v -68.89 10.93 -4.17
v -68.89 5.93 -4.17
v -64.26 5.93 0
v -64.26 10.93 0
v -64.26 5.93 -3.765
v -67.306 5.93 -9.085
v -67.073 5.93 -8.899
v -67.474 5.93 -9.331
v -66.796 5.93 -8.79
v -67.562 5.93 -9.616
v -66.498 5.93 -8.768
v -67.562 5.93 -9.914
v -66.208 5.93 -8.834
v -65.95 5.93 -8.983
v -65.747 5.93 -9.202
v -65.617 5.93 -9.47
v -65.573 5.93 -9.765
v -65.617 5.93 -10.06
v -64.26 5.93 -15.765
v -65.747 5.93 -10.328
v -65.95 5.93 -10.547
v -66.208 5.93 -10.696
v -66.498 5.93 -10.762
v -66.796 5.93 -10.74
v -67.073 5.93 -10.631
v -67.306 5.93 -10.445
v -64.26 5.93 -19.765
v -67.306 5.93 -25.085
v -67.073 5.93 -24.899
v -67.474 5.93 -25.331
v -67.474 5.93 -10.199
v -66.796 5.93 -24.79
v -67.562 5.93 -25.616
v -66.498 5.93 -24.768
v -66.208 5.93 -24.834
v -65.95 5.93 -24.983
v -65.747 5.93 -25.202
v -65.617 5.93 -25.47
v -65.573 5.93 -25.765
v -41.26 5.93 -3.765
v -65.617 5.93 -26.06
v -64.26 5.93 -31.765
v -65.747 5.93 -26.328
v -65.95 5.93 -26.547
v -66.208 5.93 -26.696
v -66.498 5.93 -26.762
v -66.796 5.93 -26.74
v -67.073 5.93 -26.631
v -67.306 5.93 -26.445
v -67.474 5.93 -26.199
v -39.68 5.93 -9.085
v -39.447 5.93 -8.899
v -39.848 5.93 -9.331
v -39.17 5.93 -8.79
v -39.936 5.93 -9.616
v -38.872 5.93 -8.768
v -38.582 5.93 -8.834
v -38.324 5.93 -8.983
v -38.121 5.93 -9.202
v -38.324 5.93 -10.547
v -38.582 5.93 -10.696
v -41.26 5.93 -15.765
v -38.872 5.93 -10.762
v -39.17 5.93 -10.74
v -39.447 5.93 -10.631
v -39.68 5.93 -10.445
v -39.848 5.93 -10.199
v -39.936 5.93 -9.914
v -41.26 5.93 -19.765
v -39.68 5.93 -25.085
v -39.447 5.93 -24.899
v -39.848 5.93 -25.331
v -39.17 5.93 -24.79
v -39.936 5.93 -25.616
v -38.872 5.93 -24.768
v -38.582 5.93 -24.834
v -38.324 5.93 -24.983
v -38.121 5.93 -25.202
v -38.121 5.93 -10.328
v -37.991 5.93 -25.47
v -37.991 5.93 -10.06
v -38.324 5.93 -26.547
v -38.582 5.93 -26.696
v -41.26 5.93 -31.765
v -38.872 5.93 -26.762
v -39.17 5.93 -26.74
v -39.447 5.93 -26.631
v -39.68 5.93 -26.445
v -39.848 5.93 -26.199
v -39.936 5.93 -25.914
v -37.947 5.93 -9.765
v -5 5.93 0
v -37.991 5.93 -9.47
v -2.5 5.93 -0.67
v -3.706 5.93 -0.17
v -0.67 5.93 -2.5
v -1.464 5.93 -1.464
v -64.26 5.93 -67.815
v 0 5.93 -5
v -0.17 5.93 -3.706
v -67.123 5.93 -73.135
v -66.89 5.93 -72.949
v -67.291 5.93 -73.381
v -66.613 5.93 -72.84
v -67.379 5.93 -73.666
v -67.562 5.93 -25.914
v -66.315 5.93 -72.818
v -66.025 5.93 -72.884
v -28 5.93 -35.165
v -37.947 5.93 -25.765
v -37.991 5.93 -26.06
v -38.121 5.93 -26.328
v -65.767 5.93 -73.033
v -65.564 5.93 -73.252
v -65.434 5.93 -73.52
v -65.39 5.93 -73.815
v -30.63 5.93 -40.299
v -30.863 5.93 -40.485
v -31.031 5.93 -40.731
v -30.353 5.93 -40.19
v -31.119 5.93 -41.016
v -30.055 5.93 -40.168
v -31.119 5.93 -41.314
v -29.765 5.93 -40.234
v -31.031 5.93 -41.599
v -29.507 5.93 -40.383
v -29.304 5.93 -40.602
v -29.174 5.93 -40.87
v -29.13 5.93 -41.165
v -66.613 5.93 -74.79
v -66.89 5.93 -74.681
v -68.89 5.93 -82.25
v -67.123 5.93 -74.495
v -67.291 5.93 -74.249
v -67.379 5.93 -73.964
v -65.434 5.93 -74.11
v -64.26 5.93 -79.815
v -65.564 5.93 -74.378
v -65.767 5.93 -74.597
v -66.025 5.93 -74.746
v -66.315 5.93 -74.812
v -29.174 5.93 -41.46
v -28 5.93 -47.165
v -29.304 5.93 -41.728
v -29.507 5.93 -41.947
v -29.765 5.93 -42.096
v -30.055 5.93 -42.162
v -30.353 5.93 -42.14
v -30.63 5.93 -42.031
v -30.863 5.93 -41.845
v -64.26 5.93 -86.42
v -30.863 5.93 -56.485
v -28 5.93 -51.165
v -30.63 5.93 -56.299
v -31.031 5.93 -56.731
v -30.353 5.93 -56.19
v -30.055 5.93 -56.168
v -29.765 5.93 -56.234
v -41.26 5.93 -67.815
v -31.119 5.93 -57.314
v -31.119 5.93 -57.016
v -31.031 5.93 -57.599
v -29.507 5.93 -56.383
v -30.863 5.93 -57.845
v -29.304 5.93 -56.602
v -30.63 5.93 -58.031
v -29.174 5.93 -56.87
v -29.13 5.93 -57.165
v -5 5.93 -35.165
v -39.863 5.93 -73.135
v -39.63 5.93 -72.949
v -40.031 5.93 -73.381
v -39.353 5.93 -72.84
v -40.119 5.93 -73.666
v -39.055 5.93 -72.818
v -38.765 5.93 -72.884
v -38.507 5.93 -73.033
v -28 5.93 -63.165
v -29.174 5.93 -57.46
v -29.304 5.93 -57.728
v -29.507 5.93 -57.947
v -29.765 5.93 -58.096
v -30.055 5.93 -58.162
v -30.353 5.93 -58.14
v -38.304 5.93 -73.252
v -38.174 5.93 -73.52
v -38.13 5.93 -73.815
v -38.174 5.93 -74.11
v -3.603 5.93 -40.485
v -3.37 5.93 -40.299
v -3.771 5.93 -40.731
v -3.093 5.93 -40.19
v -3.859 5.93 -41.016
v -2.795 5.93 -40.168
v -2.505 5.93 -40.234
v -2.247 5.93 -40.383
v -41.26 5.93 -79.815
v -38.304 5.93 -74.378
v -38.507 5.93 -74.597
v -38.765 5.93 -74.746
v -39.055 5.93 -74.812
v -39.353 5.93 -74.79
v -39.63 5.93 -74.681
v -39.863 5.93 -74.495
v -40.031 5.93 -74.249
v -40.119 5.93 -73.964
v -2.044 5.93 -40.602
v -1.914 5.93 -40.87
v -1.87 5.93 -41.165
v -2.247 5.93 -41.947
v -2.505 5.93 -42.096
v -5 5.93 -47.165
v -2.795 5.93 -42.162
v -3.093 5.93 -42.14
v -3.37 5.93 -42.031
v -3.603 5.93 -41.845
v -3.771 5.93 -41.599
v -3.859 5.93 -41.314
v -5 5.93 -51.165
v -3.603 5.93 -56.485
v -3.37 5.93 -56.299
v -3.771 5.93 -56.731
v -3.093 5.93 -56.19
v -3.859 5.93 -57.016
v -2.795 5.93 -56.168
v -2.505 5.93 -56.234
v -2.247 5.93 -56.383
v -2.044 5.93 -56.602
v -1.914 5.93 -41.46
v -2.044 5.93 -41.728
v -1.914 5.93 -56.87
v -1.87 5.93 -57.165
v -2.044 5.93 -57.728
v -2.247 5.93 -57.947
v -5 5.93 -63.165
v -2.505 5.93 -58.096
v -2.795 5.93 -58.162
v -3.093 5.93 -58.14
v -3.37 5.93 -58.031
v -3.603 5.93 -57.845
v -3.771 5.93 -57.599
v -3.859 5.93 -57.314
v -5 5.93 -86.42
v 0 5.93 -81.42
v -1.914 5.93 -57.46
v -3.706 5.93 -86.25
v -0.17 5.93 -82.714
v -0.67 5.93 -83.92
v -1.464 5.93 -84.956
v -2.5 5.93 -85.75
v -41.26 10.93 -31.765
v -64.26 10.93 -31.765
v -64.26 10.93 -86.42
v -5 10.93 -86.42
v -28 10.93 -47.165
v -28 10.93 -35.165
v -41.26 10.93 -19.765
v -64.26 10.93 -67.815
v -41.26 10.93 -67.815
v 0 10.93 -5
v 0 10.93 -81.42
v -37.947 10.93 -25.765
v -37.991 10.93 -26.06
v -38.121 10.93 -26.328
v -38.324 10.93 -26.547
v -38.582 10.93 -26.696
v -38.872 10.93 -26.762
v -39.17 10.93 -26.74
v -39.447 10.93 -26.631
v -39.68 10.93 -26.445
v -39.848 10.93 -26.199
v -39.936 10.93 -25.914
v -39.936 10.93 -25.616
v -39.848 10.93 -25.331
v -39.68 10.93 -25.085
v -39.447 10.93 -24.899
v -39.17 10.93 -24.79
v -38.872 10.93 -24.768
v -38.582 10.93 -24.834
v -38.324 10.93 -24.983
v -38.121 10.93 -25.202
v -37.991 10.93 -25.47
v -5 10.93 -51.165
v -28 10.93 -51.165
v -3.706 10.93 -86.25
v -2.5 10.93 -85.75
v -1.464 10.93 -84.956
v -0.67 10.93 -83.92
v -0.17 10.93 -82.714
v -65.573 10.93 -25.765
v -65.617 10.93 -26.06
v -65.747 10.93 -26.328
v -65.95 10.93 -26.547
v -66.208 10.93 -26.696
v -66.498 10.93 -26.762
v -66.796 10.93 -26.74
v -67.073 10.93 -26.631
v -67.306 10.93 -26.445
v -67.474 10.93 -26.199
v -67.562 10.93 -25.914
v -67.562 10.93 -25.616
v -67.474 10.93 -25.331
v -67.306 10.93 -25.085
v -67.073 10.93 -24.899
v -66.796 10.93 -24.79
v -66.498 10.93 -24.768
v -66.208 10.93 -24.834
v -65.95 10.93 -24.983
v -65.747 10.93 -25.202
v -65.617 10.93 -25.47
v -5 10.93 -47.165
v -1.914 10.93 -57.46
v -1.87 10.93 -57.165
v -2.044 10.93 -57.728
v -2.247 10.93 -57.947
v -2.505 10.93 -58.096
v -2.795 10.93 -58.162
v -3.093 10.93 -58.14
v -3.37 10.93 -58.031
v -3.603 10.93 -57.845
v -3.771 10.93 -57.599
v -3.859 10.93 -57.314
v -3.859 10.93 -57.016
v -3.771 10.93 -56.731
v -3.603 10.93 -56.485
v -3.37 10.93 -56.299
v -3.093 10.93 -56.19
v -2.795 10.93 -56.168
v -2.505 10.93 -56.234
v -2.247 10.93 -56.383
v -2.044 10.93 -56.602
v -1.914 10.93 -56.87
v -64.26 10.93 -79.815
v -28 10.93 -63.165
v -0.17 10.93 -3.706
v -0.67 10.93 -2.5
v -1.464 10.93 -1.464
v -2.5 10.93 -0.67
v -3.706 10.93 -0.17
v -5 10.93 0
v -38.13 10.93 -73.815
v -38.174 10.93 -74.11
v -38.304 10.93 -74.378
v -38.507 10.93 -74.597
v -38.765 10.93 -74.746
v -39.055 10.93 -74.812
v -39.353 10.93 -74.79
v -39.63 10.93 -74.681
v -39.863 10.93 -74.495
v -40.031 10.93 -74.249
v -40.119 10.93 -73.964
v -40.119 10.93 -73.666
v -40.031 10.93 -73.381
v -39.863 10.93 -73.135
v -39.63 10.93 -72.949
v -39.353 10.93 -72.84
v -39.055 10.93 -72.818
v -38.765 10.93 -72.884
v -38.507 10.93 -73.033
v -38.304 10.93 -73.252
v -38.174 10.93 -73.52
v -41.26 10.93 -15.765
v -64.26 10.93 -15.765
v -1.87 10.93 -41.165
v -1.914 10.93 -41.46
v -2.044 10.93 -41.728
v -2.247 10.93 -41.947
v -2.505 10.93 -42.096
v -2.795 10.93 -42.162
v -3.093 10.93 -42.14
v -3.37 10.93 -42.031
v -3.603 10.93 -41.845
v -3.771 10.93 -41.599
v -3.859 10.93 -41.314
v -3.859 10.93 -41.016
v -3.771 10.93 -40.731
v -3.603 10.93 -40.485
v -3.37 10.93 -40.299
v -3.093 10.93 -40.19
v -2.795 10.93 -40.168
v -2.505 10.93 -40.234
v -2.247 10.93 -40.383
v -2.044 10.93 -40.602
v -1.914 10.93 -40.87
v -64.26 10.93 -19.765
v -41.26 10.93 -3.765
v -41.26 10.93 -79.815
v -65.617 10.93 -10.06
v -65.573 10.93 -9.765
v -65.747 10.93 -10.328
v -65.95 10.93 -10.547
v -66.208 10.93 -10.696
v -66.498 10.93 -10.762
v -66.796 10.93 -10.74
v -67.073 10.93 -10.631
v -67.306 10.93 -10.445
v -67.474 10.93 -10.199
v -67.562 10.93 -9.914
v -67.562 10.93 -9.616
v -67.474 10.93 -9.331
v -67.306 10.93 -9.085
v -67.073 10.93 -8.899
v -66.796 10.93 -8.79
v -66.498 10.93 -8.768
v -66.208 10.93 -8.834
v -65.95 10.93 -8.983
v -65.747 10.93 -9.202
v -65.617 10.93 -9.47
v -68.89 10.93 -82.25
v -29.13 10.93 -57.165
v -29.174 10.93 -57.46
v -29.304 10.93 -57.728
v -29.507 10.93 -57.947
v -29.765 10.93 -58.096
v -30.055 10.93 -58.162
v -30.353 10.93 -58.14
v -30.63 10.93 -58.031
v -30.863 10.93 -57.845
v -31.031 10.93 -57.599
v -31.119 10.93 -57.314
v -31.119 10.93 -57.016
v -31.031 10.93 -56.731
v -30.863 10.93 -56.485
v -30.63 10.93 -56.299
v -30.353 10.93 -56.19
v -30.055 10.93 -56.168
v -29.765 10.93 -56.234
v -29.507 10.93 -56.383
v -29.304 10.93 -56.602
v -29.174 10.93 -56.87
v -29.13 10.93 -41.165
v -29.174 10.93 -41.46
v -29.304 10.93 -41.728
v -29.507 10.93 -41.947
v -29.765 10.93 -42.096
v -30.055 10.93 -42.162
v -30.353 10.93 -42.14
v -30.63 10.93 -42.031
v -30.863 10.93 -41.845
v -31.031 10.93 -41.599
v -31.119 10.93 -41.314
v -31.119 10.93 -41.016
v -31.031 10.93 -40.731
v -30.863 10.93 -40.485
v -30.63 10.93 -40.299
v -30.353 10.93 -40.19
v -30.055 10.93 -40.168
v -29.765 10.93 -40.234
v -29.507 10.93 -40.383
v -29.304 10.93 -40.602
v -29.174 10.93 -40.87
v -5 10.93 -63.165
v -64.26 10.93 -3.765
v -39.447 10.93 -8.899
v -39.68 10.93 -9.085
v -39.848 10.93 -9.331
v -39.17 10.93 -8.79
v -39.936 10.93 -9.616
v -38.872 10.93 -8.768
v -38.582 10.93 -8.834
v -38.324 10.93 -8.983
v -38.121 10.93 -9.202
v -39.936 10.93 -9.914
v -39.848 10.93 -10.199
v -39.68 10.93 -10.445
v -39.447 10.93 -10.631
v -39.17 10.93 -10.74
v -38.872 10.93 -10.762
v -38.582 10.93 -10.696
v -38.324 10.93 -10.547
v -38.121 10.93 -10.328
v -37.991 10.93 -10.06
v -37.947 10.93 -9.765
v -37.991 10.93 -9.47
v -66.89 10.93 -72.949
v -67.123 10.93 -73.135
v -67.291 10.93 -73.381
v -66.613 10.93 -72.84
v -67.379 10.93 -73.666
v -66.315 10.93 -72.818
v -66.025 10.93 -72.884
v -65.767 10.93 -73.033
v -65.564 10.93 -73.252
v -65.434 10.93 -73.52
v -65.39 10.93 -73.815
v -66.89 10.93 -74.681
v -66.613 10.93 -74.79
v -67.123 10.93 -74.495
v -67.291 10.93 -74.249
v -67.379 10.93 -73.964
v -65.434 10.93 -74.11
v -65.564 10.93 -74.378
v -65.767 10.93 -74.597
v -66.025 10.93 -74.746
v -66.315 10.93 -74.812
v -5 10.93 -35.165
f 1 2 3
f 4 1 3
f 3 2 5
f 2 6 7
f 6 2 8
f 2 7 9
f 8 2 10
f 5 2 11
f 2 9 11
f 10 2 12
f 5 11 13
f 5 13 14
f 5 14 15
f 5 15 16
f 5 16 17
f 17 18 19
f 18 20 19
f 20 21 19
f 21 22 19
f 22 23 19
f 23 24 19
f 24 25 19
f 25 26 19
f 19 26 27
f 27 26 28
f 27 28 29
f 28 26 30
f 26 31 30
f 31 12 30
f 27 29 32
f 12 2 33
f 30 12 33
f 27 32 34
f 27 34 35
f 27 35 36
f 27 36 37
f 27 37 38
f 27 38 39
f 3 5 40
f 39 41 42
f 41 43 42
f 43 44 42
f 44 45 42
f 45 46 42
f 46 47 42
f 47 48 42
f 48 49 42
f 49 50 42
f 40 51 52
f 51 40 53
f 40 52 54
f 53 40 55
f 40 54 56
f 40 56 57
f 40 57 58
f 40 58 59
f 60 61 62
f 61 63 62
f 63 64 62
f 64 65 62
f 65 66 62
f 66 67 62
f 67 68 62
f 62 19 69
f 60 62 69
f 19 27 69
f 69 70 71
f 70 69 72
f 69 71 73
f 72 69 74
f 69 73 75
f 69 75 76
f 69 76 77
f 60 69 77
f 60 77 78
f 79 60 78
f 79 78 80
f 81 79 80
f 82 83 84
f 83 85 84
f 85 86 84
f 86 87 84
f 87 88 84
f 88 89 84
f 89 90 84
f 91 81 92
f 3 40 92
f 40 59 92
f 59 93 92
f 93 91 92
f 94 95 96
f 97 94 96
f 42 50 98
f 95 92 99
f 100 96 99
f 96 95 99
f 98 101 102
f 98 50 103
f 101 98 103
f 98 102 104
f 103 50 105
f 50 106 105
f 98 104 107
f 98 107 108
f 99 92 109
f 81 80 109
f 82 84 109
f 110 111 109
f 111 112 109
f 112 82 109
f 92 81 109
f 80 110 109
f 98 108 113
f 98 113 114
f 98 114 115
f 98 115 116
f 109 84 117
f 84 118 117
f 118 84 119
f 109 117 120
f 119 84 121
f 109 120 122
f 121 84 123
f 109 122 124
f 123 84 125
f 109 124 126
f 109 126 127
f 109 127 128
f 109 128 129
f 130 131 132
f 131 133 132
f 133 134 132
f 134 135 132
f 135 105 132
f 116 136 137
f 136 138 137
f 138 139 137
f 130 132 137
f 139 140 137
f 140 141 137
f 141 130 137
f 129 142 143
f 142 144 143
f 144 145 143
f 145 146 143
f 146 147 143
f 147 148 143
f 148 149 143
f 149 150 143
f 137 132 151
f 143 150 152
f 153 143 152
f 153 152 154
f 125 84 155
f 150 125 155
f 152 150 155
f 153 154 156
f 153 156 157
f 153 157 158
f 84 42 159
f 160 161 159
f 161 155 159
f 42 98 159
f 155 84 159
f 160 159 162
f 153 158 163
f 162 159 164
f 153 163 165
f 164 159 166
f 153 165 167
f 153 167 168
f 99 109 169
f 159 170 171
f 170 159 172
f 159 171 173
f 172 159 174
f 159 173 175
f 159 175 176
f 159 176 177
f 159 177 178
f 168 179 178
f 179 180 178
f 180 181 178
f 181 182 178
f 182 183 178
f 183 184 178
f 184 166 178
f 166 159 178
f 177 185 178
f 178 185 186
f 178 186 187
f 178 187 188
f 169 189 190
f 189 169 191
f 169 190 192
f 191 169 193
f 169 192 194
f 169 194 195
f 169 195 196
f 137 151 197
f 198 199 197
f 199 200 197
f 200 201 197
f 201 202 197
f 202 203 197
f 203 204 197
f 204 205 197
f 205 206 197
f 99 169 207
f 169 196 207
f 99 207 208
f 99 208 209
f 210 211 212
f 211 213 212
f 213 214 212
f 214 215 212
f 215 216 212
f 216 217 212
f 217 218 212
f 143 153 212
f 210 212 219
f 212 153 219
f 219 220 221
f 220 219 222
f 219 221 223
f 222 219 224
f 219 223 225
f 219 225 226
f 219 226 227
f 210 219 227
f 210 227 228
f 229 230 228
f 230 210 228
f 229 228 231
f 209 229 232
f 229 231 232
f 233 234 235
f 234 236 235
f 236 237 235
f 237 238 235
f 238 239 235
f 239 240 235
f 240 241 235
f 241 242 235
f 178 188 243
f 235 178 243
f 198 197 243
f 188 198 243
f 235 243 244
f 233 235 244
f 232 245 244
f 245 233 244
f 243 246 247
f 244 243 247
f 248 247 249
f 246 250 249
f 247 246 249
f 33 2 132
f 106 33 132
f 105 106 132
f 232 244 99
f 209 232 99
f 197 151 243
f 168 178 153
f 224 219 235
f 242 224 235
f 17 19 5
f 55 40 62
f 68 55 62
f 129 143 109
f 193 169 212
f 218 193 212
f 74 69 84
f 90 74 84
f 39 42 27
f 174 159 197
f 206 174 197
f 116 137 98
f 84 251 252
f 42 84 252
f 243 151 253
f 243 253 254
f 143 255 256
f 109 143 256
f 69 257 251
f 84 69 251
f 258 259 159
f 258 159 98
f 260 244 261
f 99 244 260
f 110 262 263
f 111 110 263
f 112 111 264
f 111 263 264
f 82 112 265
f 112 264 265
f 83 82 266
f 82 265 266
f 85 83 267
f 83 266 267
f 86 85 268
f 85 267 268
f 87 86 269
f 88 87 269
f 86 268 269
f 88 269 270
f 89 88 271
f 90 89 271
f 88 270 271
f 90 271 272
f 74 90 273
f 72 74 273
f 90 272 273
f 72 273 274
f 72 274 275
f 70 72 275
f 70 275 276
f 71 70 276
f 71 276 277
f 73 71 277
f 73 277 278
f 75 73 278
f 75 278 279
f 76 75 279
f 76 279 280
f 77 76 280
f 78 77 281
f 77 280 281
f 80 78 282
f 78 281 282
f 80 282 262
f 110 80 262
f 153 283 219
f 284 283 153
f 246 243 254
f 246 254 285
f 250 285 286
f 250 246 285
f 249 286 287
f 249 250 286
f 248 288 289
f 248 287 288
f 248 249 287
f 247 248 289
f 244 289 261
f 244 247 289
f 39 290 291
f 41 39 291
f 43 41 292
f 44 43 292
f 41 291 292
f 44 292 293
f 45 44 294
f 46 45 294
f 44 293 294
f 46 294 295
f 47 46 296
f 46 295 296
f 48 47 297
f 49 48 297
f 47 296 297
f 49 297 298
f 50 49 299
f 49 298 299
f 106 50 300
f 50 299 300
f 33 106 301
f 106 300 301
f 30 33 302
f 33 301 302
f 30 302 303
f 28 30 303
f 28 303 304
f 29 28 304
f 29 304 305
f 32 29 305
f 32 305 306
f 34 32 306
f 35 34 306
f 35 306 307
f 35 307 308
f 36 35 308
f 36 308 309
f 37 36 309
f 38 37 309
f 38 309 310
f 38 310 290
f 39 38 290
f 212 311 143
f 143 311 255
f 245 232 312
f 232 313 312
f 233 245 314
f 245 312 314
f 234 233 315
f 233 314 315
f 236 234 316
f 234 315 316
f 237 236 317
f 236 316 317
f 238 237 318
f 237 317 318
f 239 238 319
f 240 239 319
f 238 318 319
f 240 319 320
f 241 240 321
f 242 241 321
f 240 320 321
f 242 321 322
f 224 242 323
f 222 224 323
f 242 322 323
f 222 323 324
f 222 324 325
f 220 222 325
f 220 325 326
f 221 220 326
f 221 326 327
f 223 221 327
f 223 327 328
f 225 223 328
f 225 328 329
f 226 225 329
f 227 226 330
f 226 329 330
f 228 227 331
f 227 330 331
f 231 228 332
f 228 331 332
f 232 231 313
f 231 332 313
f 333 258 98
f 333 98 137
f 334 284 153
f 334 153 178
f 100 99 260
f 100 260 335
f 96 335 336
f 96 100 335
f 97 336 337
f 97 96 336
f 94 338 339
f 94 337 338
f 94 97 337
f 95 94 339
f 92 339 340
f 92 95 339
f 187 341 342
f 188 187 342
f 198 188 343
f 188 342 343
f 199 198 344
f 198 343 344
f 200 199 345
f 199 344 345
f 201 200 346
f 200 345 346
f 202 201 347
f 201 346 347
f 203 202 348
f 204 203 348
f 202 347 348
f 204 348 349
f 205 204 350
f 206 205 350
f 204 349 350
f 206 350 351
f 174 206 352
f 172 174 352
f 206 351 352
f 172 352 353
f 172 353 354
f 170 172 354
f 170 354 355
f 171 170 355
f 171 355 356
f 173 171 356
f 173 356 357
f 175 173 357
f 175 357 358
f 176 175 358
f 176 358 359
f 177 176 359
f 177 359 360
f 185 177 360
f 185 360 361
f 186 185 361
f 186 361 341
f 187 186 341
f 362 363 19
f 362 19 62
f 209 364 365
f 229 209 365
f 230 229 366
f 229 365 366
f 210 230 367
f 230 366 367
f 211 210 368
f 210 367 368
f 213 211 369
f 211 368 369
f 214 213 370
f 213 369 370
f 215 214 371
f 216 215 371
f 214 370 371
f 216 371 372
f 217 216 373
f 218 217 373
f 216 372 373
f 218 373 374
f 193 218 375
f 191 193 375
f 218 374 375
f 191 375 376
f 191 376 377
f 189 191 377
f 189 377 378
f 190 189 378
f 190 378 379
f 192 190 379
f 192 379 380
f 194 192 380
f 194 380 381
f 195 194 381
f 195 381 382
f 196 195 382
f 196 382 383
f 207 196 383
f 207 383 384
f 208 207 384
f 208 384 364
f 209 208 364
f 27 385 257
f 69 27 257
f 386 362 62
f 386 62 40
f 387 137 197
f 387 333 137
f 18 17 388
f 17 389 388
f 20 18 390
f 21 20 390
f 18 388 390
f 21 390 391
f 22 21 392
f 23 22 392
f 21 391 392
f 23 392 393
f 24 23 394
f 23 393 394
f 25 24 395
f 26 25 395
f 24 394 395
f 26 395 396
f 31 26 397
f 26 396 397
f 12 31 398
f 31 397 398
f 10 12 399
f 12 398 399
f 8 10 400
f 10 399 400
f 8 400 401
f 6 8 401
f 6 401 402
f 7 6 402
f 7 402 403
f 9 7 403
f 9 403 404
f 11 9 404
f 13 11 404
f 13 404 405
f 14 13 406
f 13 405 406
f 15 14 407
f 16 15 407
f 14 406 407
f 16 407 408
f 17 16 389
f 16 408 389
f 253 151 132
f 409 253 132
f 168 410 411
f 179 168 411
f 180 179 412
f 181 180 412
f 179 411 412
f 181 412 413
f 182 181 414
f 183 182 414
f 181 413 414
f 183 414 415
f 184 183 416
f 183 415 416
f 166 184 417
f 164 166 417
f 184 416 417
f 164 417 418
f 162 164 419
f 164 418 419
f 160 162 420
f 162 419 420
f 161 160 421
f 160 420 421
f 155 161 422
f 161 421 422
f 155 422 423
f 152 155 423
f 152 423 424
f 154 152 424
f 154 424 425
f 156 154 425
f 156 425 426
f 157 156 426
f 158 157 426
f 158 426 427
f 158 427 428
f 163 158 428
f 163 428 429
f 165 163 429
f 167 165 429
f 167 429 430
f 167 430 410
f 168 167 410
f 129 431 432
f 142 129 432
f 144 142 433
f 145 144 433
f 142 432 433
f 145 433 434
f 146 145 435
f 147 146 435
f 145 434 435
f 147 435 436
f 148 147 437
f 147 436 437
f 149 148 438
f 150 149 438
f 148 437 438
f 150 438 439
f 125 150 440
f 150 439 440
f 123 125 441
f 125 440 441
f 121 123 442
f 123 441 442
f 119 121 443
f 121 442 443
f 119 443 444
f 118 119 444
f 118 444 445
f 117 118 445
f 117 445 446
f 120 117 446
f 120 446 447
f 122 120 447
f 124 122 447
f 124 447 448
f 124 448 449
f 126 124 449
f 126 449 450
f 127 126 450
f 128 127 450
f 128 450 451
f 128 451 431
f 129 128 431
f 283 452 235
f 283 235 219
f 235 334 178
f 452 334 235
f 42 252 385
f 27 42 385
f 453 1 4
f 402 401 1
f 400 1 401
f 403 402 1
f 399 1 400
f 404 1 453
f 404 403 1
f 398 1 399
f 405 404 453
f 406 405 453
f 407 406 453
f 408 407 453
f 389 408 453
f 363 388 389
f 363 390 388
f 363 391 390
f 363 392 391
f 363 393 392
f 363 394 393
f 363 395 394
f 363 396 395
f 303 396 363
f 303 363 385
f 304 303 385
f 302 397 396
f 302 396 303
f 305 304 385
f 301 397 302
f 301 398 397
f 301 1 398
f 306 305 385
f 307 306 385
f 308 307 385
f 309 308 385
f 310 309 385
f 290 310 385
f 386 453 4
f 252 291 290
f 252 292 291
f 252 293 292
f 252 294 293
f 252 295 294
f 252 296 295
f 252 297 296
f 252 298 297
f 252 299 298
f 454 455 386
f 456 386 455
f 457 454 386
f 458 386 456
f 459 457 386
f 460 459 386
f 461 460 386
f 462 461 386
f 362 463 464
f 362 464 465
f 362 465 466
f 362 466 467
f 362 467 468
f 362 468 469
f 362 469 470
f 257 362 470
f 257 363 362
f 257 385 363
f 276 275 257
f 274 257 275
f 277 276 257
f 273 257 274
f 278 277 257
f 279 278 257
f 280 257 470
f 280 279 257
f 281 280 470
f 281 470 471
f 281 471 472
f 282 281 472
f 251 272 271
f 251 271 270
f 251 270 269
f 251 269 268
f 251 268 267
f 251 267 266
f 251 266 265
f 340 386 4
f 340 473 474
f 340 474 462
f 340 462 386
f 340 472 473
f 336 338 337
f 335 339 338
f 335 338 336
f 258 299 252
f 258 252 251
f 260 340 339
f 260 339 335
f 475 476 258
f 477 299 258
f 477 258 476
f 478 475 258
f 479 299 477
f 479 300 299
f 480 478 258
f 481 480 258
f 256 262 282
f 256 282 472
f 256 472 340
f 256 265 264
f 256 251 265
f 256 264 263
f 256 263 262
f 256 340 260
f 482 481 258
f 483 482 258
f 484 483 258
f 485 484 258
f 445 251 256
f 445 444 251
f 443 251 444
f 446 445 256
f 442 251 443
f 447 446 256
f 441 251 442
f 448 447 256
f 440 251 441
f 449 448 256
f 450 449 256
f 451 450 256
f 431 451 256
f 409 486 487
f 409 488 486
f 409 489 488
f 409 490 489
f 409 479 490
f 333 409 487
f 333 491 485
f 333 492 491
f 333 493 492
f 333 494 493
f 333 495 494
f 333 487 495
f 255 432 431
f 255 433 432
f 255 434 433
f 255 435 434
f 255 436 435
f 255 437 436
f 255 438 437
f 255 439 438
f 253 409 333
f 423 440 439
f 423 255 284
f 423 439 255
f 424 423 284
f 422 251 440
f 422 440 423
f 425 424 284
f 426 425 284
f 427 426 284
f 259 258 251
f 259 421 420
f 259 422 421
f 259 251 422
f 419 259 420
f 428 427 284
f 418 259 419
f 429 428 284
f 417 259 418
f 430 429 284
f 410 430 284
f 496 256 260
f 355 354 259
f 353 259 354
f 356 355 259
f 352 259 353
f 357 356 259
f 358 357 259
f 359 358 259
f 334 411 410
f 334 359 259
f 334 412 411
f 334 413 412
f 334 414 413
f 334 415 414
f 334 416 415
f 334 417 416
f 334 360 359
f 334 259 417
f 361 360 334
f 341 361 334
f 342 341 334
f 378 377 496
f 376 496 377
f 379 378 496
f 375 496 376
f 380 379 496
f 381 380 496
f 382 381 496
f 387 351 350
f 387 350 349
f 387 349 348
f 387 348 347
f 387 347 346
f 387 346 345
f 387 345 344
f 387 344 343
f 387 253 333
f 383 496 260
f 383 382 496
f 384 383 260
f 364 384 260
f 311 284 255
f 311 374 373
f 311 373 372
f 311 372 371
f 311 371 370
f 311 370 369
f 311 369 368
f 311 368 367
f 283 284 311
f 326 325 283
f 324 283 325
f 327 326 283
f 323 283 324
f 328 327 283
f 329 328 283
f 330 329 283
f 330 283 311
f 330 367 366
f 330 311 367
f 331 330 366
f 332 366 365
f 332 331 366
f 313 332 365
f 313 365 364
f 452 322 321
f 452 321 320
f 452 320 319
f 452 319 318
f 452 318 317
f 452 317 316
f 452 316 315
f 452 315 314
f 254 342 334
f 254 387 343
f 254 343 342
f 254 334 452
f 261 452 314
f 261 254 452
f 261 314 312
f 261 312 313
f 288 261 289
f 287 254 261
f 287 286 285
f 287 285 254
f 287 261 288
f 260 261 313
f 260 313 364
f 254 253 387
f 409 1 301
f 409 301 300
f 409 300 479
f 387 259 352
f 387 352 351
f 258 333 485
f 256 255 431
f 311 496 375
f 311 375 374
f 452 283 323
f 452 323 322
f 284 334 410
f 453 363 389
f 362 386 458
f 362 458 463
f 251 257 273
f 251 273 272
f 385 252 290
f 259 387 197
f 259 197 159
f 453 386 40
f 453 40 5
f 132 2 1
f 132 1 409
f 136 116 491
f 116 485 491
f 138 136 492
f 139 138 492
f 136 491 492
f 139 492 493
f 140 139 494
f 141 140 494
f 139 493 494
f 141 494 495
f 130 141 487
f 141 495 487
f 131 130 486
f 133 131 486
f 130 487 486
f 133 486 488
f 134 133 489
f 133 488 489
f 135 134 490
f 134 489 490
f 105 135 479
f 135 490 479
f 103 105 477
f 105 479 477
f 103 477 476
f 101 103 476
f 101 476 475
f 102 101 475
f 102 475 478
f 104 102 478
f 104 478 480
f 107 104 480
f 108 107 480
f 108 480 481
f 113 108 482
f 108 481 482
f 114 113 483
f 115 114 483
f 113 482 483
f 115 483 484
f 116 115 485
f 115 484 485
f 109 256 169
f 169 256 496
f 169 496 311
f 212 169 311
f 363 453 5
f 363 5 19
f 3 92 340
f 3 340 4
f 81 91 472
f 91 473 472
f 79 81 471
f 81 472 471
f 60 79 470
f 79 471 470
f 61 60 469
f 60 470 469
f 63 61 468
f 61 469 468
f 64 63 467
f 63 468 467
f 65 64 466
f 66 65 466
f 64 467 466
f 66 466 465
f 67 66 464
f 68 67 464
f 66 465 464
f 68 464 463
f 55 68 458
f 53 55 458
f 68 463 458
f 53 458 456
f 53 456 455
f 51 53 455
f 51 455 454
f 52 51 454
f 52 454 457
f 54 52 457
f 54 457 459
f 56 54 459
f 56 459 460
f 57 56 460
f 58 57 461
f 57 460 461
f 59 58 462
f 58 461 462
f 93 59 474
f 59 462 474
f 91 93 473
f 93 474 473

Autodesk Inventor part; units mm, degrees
ref_plane "YZ Plane" through (0, 0, 0) normal (1, 0, 0) x (0, 1, 0)
ref_plane "XZ Plane" through (0, 0, 0) normal (0, 1, 0) x (-1, 0, 0)
ref_plane "Work Plane2" through (0, 5.93, 0) normal (0, 1, 0) x (1, 0, 0)
sketch "Sketch7" plane through (0, 5.93, 0) normal (0, 1, 0) x (1, 0, 0)
  line L0 (-68.89, 72.25) -> (-68.89, 75.38) projected
  line L1 (-70.59, 75.38) -> (-68.89, 75.38) projected
  line L2 (-70.59, 83.0068) -> (-70.59, 75.38) projected
  line L3 (-64.9127, 88.12) -> (-70.59, 83.0068) projected
  line L4 (-5, 88.12) -> (-64.9127, 88.12) projected
  arc A0 (1.7, 81.42) -> (-5, 88.12) centre (-5, 81.42) ccw projected
  line L5 (1.7, 5) -> (1.7, 81.42) projected
  arc A1 (-5, -1.7) -> (1.7, 5) centre (-5, 5) ccw projected
  line L6 (-64.9127, -1.7) -> (-5, -1.7) projected
  line L7 (-70.59, 3.4132) -> (-64.9127, -1.7) projected
  line L8 (-70.59, 14.5) -> (-70.59, 3.4132) projected
  line L9 (-68.89, 14.5) -> (-70.59, 14.5) projected
  line L10 (-68.89, 14.5) -> (-68.89, 17.63) projected
  line L11 (-70.59, 17.63) -> (-68.89, 17.63) projected
  line L12 (-70.59, 47.6) -> (-70.59, 17.63) projected
  line L13 (-68.89, 47.6) -> (-70.59, 47.6) projected
  line L14 (-68.89, 47.6) -> (-68.89, 50.73) projected
  line L15 (-70.59, 50.73) -> (-68.89, 50.73) projected
  line L16 (-70.59, 72.25) -> (-70.59, 50.73) projected
  line L17 (-68.89, 72.25) -> (-70.59, 72.25) projected
  line L18 (5.3534, 92.34) -> (10.14, 87.0271) projected
  line L19 (-69.6869, 92.34) -> (5.3534, 92.34) projected
  line L20 (-73.78, 86.0365) -> (-69.6869, 92.34) projected
  line L21 (-73.78, 75.38) -> (-73.78, 86.0365) projected
  line L22 (-73.78, 75.38) -> (-73.78, 72.25) projected
  line L23 (-73.78, 50.73) -> (-73.78, 72.25) projected
  line L24 (-73.78, 50.73) -> (-73.78, 47.6) projected
  line L25 (-73.78, 17.63) -> (-73.78, 47.6) projected
  line L26 (-73.78, 17.63) -> (-73.78, 14.5) projected
  line L27 (-73.78, -2.6865) -> (-73.78, 14.5) projected
  line L28 (-69.6869, -8.99) -> (-73.78, -2.6865) projected
  line L29 (4.8271, -8.99) -> (-69.6869, -8.99) projected
  line L30 (10.14, -4.2034) -> (4.8271, -8.99) projected
  line L31 (10.14, 87.0271) -> (10.14, -4.2034) projected
  line L32 (-5, 0) -> (-64.26, 0) projected
  line L33 (-68.89, 4.17) -> (-64.26, 0) projected
  line L34 (-68.89, 4.17) -> (-68.89, 14.5) projected
  line L35 (-68.89, 17.63) -> (-68.89, 47.6) projected
  line L36 (-68.89, 50.73) -> (-68.89, 72.25) projected
  line L37 (-68.89, 75.38) -> (-68.89, 82.25) projected
  line L38 (-64.26, 86.42) -> (-68.89, 82.25) projected
  line L39 (-64.26, 86.42) -> (-5, 86.42) projected
  arc A2 (0, 81.42) -> (-5, 86.42) centre (-5, 81.42) ccw projected
  line L40 (0, 81.42) -> (0, 5) projected
  arc A3 (-5, 0) -> (0, 5) centre (-5, 5) ccw projected
  line L41 (-68.89, 14.5) -> (-70.59, 14.5) projected
  line L42 (-68.89, 14.5) -> (-68.89, 75.38)
  point P0 (0, 0)
extrude "Extrusion6" add sketch "Sketch7" along normal blind 5 contours L0 L37 L38 L39 A2 L40 A3 L32 L33 L34 L10 L35 L14 L36
sketch "Sketch8" plane through (0, 10.93, 0) normal (0, 1, 0) x (1, 0, 0)
  line L0 (-64.26, 0) -> (-64.26, 16.2)
  line L1 (-64.26, 16.2) -> (-64.26, 17.765)
  line L2 (-64.26, 17.765) -> (-41.26, 17.765)
  line L3 (-64.26, 17.765) -> (-64.26, 15.765)
  line L4 (-64.26, 15.765) -> (-41.26, 15.765)
  line L5 (-41.26, 15.765) -> (-41.26, 3.765)
  line L6 (-41.26, 3.765) -> (-64.26, 3.765)
  line L7 (-64.26, 3.765) -> (-64.26, 15.765)
  line L8 (-64.26, 9.765) -> (-66.573, 9.765)
  circle A0 centre (-66.573, 9.765) radius 1
  line L9 (-41.26, 9.765) -> (-38.947, 9.765)
  circle A1 centre (-38.947, 9.765) radius 1
  line L10 (-64.26, 17.765) -> (-64.26, 19.765)
  line L11 (-64.26, 19.765) -> (-41.26, 19.765)
  line L12 (-41.26, 19.765) -> (-41.26, 31.765)
  line L13 (-41.26, 31.765) -> (-64.26, 31.765)
  line L14 (-64.26, 31.765) -> (-64.26, 19.765)
  line L15 (-64.26, 25.765) -> (-66.573, 25.765)
  circle A2 centre (-66.573, 25.765) radius 1
  line L16 (-41.26, 25.765) -> (-38.947, 25.765)
  circle A3 centre (-38.947, 25.765) radius 1
  point P0 (0, 0)
  dimension "d56" = 16.2
  dimension "d57" = 1.565
  dimension "d58" = 23
  dimension "d59" = 90
  dimension "d60" = 2
  dimension "d61" = 23
  dimension "d62" = 12
  dimension "d63" = 2.313
  dimension "d64" = 2
  dimension "d65" = 2.313
  dimension "d66" = 2
  dimension "d67" = 2
  dimension "d68" = 23
  dimension "d69" = 12
  dimension "d70" = 2.313
  dimension "d71" = 2
  dimension "d73" = 2
extrude "Extrusion7" cut sketch "Sketch8" against normal up to surface (5 mm away)
sketch "Sketch9" plane through (0, 10.93, 0) normal (0, 1, 0) x (1, 0, 0)
  line L0 (-5, 86.42) -> (-64.26, 86.42) projected
  line L1 (-64.26, 86.42) -> (-64.26, 75.38)
  line L2 (-64.26, 75.38) -> (-64.26, 73.815)
  line L3 (-64.26, 73.815) -> (-64.26, 79.815)
  line L4 (-64.26, 79.815) -> (-41.26, 79.815)
  line L5 (-64.26, 73.815) -> (-66.39, 73.815)
  circle A0 centre (-66.39, 73.815) radius 1
  line L6 (-41.26, 79.815) -> (-41.26, 67.815)
  line L7 (-41.26, 67.815) -> (-64.26, 67.815)
  line L8 (-64.26, 67.815) -> (-64.26, 73.815)
  line L9 (-41.26, 73.815) -> (-39.13, 73.815)
  circle A1 centre (-39.13, 73.815) radius 1
  point P0 (0, 0)
  dimension "d76" = 11.04
  dimension "d77" = 1.565
  dimension "d79" = 6
  dimension "d80" = 23
  dimension "d82" = 2.13
  dimension "d85" = 2
  dimension "d88" = 12
  dimension "d89" = 23
  dimension "d90" = 2.13
  dimension "d91" = 2
extrude "Extrusion8" cut sketch "Sketch9" against normal up to surface (5 mm away)
sketch "Sketch10" plane through (0, 10.93, 0) normal (0, 1, 0) x (1, 0, 0)
  arc A0 (0, 81.42) -> (-5, 86.42) centre (-5, 81.42) ccw projected
  line L0 (0, 81.42) -> (0, 49.165)
  line L1 (0, 49.165) -> (-5, 49.165)
  line L2 (-5, 49.165) -> (-5, 51.165)
  line L3 (-5, 49.165) -> (-5, 47.165)
  line L4 (-5, 51.165) -> (-28, 51.165)
  line L5 (-28, 51.165) -> (-28, 63.165)
  line L6 (-28, 63.165) -> (-5, 63.165)
  line L7 (-5, 63.165) -> (-5, 51.165)
  line L8 (-5, 47.165) -> (-28, 47.165)
  line L9 (-28, 47.165) -> (-28, 35.165)
  line L10 (-28, 35.165) -> (-5, 35.165)
  line L11 (-5, 35.165) -> (-5, 47.165)
  line L12 (-28, 41.165) -> (-30.13, 41.165)
  line L13 (-5, 41.165) -> (-2.87, 41.165)
  circle A1 centre (-30.13, 41.165) radius 1
  circle A2 centre (-2.87, 41.165) radius 1
  line L14 (-28, 57.165) -> (-30.13, 57.165)
  line L15 (-5, 57.165) -> (-2.87, 57.165)
  circle A3 centre (-30.13, 57.165) radius 1
  circle A4 centre (-2.87, 57.165) radius 1
  point P0 (0, 0)
  dimension "d92" = 32.255
  dimension "d93" = 5
  dimension "d94" = 2
  dimension "d95" = 2
  dimension "d96" = 23
  dimension "d97" = 12
  dimension "d98" = 23
  dimension "d99" = 12
  dimension "d100" = 2.13
  dimension "d101" = 2.13
  dimension "d102" = 2
  dimension "d103" = 2
  dimension "d104" = 2.13
  dimension "d105" = 2.13
  dimension "d106" = 2
  dimension "d107" = 2
extrude "Extrusion9" cut sketch "Sketch10" against normal up to surface (5 mm away)
properties part number "Robotic Hand Tray"
